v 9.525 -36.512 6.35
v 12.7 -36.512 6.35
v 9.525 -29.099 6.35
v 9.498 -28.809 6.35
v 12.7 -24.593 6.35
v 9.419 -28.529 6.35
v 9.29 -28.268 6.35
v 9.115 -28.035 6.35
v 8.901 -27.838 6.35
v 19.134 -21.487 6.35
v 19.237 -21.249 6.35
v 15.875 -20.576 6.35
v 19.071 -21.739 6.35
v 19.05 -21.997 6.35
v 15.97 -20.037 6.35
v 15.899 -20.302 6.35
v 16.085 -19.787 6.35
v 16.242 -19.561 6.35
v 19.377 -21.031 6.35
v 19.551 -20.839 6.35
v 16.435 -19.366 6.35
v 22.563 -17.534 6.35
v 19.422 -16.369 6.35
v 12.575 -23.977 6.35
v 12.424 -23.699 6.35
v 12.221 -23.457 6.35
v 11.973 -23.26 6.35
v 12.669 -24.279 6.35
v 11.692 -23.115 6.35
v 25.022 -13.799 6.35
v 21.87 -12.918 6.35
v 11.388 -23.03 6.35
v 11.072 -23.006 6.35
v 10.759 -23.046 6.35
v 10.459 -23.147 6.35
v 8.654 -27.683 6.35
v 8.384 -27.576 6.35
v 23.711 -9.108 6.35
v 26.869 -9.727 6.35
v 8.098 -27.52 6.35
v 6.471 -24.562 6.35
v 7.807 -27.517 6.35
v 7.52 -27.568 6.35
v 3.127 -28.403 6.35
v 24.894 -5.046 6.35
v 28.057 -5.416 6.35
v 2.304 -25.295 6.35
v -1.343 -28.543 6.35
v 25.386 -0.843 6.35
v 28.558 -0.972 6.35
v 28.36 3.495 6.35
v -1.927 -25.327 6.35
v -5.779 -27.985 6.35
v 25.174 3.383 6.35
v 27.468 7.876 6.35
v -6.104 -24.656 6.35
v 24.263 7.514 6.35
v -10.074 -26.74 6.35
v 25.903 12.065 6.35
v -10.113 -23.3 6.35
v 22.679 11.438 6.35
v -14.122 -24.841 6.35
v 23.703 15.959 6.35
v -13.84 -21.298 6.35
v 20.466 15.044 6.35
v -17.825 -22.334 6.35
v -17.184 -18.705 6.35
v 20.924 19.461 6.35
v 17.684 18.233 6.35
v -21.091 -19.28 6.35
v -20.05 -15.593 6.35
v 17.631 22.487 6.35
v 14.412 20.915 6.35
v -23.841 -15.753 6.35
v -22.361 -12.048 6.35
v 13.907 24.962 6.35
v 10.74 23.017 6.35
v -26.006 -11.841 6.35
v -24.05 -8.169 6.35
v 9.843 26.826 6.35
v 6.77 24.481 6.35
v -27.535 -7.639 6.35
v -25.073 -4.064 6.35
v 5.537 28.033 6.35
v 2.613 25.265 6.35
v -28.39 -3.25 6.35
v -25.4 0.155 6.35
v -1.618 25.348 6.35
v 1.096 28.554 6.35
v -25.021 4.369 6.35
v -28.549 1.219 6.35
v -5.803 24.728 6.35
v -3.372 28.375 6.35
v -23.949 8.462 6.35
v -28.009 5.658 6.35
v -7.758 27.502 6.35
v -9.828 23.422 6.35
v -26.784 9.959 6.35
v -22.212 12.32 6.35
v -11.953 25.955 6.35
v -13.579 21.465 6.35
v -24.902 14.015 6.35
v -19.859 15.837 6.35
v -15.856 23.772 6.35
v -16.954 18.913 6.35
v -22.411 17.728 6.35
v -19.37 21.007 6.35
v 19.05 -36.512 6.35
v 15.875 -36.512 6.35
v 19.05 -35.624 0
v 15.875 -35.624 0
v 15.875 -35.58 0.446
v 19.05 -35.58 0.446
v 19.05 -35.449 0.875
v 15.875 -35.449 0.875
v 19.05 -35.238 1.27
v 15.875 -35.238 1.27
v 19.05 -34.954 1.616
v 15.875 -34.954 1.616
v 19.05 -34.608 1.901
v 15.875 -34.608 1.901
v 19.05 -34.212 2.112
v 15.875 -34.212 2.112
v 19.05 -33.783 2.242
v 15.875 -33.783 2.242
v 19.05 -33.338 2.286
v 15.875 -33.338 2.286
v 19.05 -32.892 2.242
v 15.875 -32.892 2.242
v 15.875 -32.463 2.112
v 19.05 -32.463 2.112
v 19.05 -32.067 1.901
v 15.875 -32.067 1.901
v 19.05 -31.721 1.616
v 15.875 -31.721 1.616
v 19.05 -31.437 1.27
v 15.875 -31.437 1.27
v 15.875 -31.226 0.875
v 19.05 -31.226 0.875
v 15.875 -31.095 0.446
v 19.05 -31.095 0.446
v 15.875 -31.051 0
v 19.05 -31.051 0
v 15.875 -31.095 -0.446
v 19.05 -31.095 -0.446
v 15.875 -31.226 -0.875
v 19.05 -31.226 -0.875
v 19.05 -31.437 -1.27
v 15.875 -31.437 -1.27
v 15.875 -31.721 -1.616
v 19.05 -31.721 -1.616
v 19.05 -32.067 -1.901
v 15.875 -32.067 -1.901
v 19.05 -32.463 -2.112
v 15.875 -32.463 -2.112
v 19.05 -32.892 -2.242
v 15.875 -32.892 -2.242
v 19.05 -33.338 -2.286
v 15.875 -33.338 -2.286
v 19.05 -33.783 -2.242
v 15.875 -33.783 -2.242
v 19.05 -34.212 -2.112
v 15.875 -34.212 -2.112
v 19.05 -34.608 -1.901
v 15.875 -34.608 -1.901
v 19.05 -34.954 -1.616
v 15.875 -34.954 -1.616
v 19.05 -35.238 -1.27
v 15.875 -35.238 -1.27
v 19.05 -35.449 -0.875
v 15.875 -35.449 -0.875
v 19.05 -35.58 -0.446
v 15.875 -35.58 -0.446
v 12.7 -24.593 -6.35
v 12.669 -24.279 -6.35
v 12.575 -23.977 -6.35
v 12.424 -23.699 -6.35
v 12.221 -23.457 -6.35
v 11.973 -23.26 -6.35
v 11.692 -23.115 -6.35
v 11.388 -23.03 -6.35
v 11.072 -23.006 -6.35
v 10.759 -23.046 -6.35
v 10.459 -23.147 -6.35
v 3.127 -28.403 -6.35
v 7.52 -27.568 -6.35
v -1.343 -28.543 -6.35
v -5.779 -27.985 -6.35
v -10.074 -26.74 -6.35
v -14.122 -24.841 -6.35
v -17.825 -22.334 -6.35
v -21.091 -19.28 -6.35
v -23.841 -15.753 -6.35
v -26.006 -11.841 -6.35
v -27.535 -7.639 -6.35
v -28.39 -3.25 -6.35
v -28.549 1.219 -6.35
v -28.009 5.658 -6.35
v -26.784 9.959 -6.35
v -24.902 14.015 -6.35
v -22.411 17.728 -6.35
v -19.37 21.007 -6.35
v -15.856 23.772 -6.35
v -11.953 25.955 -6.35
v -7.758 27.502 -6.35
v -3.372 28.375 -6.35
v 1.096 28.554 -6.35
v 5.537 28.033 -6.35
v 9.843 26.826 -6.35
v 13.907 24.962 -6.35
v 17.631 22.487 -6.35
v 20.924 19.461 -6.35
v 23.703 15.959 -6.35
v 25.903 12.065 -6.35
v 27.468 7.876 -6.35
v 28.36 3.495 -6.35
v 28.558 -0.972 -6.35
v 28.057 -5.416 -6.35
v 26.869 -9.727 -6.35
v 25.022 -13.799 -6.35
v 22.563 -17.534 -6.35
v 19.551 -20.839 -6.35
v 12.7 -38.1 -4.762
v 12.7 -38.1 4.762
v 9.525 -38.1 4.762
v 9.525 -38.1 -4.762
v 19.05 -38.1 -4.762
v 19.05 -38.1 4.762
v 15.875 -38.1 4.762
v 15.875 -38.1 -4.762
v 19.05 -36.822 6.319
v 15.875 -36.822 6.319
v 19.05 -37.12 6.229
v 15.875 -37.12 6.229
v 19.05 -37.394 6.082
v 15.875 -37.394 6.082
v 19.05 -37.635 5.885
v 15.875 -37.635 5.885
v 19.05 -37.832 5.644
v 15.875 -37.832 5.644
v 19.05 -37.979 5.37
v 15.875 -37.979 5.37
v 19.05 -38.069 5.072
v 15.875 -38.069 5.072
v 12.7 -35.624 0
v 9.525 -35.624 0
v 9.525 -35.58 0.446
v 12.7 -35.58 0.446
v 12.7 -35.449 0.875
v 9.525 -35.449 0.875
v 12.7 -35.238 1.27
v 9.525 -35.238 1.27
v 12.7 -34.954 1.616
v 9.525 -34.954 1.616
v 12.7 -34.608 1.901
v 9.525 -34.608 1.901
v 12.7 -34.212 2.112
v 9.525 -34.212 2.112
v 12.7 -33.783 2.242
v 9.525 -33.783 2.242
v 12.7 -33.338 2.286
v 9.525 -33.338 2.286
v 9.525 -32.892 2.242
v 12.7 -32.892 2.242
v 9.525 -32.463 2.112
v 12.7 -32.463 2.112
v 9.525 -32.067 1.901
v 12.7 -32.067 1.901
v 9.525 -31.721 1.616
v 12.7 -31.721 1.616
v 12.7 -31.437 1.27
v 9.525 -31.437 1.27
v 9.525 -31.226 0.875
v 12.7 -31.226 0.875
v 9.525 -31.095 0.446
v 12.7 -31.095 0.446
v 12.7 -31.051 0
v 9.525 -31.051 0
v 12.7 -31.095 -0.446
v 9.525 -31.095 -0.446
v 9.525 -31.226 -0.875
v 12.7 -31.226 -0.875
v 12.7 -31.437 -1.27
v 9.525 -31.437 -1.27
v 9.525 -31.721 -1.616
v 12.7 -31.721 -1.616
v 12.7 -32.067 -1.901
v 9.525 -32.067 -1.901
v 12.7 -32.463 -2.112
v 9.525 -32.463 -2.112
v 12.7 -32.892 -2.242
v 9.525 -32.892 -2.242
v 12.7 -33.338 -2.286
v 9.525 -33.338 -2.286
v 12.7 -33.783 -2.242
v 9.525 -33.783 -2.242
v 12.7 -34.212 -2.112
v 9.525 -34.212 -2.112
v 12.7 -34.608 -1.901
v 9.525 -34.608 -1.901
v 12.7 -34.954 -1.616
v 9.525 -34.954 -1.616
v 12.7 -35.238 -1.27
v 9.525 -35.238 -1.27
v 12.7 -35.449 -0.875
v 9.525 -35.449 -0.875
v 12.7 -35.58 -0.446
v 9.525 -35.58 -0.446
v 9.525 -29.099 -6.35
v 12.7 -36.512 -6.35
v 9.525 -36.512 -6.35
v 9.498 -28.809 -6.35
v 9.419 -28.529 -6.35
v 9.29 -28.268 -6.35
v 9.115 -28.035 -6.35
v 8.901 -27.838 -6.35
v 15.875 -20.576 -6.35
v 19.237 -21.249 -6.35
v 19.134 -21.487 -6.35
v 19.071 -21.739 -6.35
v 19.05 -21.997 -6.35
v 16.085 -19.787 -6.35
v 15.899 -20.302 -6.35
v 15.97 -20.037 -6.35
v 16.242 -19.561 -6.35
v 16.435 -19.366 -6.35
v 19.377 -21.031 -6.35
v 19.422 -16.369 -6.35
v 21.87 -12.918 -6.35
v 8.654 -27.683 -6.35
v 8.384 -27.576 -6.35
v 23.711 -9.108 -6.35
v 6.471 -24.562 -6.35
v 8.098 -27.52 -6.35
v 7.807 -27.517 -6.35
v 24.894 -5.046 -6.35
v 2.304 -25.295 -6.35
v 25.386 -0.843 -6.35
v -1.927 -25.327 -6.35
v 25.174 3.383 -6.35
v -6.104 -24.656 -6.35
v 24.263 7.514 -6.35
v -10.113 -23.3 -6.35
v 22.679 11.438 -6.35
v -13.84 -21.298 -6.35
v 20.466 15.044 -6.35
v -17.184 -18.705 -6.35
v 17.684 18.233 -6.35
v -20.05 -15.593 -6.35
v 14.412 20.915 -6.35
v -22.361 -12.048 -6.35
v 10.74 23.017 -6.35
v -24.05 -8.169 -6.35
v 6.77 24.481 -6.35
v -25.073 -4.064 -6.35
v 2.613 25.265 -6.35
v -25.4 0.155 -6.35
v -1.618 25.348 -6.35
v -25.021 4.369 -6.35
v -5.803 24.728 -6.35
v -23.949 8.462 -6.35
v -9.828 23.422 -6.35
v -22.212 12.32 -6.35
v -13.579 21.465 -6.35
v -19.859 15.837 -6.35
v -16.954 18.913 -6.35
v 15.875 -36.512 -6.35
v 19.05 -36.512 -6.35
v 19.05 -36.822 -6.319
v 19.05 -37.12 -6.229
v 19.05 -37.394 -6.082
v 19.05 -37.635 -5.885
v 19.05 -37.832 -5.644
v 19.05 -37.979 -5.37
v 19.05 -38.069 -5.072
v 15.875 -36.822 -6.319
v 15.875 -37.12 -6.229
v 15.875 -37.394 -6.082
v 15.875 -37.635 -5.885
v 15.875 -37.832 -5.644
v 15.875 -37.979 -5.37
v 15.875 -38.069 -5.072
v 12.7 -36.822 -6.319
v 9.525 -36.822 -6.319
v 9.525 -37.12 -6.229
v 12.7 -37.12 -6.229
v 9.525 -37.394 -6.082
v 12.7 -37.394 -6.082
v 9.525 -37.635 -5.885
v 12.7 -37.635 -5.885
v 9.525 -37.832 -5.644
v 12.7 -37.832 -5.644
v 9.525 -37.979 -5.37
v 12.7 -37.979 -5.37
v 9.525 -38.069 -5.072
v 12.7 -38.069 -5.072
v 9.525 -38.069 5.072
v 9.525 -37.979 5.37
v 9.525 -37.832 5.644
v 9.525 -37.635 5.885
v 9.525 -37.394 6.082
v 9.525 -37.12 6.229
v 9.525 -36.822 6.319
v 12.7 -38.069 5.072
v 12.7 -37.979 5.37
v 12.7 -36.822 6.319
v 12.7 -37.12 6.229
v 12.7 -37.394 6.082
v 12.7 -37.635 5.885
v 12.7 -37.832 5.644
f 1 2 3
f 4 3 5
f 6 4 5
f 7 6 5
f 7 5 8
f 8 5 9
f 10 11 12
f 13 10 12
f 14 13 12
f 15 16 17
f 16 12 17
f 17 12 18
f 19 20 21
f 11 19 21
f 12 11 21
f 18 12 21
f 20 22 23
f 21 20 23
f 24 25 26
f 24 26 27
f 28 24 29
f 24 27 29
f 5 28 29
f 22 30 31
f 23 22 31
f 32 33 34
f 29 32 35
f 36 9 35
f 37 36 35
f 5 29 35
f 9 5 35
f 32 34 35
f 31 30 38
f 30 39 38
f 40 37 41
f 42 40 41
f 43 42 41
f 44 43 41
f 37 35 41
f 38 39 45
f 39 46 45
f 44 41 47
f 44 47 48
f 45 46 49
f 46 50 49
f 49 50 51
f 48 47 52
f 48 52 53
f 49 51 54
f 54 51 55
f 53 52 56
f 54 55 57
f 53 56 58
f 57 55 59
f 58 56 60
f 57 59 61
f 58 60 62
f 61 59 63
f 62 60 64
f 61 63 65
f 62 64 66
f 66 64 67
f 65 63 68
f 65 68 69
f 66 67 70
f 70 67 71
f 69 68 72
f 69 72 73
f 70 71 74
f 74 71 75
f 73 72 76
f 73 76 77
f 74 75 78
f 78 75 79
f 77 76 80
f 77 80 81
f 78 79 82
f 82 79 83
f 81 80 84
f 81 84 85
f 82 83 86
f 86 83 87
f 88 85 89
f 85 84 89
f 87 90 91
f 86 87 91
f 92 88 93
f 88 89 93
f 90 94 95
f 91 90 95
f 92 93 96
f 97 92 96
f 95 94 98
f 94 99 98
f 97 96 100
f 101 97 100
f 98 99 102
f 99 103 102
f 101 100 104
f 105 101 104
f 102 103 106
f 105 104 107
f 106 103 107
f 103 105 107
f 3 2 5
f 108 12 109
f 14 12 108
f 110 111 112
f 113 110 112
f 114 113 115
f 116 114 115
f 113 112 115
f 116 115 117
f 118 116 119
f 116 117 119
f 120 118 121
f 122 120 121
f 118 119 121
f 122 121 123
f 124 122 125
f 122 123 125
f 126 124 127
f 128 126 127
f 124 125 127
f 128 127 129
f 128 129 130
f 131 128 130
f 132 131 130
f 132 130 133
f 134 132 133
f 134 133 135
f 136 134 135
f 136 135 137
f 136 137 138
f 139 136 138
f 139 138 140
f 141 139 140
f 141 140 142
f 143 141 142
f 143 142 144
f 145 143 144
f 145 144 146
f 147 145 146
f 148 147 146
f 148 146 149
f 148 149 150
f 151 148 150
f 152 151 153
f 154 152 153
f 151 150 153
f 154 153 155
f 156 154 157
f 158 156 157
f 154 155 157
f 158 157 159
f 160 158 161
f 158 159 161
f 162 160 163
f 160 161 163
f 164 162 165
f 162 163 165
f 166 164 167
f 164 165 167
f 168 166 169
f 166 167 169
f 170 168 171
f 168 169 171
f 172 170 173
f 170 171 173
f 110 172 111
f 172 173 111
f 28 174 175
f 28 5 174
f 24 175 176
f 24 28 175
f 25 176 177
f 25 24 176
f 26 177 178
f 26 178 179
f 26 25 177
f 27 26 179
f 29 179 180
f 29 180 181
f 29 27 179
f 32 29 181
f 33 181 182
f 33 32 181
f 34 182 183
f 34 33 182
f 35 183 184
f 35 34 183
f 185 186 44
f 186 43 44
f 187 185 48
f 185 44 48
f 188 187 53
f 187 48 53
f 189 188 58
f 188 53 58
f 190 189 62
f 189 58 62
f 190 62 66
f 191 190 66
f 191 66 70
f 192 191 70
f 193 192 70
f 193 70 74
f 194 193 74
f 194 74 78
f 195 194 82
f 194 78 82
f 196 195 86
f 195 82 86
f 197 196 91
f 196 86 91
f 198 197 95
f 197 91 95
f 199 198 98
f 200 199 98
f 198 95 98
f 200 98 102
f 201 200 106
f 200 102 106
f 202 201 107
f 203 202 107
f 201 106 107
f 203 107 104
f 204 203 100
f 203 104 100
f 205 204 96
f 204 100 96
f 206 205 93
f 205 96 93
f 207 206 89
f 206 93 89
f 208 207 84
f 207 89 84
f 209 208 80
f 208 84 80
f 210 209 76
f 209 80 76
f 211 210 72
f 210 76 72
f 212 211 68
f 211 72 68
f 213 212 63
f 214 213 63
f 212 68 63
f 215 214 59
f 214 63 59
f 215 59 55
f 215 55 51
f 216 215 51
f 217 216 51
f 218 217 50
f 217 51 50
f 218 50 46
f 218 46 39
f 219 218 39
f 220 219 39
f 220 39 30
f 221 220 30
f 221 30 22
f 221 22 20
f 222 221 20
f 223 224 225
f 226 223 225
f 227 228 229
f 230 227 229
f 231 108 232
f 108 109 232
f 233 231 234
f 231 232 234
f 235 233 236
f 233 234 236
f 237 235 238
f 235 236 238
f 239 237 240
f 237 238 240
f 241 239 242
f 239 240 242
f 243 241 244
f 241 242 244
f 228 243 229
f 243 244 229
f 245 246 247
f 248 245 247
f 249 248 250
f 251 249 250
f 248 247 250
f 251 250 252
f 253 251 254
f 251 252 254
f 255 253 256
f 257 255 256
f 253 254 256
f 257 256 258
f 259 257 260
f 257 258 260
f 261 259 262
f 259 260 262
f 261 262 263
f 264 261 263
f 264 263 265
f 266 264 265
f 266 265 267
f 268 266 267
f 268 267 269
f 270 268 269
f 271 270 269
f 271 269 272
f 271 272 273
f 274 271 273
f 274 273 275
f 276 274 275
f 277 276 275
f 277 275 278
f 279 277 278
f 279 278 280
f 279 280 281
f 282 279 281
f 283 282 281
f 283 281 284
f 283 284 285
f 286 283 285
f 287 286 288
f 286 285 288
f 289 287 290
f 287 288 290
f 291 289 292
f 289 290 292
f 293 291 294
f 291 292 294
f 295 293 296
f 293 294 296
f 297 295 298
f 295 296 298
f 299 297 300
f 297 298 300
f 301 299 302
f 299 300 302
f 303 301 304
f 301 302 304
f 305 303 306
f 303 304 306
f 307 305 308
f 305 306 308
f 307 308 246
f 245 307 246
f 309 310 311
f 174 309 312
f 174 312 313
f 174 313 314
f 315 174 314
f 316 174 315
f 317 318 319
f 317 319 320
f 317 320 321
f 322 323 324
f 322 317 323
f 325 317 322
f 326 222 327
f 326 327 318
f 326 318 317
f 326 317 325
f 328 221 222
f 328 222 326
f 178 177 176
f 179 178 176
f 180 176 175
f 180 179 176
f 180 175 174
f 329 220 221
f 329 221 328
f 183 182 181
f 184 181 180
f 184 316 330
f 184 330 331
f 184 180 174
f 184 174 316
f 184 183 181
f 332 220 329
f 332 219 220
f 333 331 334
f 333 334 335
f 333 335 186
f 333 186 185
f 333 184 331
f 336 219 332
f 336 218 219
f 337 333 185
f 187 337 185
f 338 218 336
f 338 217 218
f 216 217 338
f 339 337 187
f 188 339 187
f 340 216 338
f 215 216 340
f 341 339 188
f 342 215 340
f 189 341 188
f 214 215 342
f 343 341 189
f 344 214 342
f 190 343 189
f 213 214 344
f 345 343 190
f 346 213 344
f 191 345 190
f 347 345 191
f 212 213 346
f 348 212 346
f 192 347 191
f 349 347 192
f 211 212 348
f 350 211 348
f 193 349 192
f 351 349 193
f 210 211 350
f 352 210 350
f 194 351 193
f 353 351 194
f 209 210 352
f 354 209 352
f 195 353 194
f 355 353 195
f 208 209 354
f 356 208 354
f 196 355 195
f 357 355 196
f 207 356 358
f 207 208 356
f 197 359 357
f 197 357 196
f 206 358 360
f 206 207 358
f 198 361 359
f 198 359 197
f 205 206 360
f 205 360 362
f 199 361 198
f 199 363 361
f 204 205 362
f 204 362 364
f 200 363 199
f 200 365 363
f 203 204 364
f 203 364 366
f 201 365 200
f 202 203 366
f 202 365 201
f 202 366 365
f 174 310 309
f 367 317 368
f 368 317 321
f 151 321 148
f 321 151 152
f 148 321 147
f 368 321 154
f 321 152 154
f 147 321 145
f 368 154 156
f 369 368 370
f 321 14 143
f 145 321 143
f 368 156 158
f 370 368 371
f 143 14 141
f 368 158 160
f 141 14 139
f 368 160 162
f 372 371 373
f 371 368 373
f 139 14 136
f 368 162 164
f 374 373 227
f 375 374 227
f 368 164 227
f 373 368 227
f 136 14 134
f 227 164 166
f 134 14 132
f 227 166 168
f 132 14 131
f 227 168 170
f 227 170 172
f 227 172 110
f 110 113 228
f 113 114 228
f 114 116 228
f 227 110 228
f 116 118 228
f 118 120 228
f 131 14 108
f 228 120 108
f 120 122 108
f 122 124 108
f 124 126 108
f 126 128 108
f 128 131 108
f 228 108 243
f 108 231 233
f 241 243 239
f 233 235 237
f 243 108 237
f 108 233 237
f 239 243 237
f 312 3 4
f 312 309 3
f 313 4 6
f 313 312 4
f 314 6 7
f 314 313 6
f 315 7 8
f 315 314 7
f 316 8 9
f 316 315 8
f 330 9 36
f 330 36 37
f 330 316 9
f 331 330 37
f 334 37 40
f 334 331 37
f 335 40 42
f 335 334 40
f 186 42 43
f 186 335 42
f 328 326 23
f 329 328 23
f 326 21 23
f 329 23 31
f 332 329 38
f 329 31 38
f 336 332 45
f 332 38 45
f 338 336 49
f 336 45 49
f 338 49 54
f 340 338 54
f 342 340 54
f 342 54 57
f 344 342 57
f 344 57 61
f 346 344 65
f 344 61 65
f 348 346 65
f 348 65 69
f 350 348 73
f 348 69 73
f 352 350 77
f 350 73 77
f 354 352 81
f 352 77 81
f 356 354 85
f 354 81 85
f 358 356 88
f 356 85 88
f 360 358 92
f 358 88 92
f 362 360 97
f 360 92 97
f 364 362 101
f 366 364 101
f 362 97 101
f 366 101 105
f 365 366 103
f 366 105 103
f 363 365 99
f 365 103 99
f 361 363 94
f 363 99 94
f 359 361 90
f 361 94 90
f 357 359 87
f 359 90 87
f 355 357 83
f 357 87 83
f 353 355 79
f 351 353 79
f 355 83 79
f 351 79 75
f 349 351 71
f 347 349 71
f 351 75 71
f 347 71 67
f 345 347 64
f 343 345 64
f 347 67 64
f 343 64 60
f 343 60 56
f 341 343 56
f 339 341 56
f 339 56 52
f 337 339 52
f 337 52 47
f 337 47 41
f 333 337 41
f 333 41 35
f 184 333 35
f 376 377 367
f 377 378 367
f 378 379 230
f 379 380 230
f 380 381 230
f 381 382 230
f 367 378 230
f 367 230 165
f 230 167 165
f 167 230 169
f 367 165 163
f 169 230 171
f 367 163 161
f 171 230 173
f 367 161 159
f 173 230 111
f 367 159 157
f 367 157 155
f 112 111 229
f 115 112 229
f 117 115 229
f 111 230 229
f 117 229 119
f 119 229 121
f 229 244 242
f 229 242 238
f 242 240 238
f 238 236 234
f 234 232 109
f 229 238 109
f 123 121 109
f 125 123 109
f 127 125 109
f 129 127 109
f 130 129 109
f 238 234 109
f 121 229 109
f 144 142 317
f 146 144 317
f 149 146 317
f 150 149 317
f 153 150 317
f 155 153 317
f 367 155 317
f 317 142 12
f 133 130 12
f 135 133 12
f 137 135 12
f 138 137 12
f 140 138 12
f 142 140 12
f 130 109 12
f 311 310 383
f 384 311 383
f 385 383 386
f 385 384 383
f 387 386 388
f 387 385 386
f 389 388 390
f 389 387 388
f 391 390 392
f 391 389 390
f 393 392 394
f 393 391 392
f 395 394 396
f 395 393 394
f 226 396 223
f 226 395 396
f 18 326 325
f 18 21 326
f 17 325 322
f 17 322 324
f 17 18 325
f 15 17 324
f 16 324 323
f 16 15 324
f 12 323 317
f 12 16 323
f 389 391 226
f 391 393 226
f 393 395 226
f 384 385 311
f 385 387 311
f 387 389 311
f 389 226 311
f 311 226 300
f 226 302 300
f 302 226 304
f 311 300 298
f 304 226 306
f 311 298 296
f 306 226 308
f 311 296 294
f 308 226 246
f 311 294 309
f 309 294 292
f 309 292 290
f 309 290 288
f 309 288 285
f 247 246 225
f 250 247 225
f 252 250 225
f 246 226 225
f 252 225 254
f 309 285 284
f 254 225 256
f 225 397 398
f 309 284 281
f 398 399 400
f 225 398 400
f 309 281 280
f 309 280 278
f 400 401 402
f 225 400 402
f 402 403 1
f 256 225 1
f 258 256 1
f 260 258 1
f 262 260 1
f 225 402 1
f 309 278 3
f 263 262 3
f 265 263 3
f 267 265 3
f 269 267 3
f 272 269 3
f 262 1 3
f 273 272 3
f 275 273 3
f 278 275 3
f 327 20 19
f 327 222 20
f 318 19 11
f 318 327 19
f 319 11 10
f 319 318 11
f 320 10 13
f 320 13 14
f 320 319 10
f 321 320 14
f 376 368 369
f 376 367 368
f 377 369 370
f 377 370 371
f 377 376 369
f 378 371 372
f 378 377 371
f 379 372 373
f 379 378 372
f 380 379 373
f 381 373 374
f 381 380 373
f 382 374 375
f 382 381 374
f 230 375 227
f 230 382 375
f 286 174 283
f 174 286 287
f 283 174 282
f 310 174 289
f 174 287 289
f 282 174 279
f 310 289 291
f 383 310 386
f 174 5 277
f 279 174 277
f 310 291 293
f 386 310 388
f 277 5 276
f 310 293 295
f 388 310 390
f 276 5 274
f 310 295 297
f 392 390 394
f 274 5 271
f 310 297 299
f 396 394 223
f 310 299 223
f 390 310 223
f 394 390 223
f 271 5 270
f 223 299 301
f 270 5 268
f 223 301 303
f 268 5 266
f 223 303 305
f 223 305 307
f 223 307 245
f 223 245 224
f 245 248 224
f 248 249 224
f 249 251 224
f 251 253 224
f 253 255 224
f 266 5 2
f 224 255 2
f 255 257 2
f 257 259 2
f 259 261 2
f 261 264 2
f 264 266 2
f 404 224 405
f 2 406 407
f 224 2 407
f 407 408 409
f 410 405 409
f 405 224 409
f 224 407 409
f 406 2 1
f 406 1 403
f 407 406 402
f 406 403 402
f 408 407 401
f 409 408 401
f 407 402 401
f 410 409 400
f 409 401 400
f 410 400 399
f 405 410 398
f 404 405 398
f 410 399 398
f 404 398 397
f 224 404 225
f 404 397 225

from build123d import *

# Parameters (mm, degrees)
BOSS_EXTRUDE1_DEPTH = 6.35
SKETCH2_R           = 2.286
CUT_EXTRUDE1_DEPTH  = 55.254423783
FILLET1_R           = 1.5875


with BuildPart() as part:
    # Sketch1 → Boss-Extrude1 (new, symmetric)
    with BuildSketch(Plane.XY):
        with BuildLine():
            Line((12.7, -21.997045256), (12.7, -38.1))
            Line((12.7, -38.1), (9.525, -38.1))
            Line((9.525, -38.1), (9.525, -26.940768363))
            ThreePointArc((9.525, -26.940768363), (-14.563355395, 24.585347357), (19.05, -21.298547486))
            Line((19.05, -21.298547486), (19.05, -38.1))
            Line((19.05, -38.1), (15.875, -38.1))
            Line((15.875, -38.1), (15.875, -19.827868645))
            ThreePointArc((15.875, -19.827868645), (-14.328607331, 20.9726253), (12.7, -21.997045256))
        make_face()
    extrude(amount=BOSS_EXTRUDE1_DEPTH, both=True)

    # Sketch2 → Cut-Extrude1 (cut, through all)
    with BuildSketch(Plane.ZY.offset(-9.525)):
        with Locations(Location((0, -33.3375, 0), (0, 0, 270))):
            Circle(SKETCH2_R)
    extrude(amount=-CUT_EXTRUDE1_DEPTH, mode=Mode.SUBTRACT)

    # Fillet1
    fillet1_edges = [part.edges().sort_by_distance(p)[0] for p in [
        (17.4625, -38.1, -6.35),
        (17.4625, -38.1, 6.35),
        (12.7, -21.997045256, 0),
        (9.525, -26.940768363, 0),
        (19.05, -21.298547486, 0),
        (15.875, -19.827868645, 0),
        (11.1125, -38.1, 6.35),
        (11.1125, -38.1, -6.35),
    ]]
    fillet(fillet1_edges, radius=FILLET1_R)


solid = part.part
